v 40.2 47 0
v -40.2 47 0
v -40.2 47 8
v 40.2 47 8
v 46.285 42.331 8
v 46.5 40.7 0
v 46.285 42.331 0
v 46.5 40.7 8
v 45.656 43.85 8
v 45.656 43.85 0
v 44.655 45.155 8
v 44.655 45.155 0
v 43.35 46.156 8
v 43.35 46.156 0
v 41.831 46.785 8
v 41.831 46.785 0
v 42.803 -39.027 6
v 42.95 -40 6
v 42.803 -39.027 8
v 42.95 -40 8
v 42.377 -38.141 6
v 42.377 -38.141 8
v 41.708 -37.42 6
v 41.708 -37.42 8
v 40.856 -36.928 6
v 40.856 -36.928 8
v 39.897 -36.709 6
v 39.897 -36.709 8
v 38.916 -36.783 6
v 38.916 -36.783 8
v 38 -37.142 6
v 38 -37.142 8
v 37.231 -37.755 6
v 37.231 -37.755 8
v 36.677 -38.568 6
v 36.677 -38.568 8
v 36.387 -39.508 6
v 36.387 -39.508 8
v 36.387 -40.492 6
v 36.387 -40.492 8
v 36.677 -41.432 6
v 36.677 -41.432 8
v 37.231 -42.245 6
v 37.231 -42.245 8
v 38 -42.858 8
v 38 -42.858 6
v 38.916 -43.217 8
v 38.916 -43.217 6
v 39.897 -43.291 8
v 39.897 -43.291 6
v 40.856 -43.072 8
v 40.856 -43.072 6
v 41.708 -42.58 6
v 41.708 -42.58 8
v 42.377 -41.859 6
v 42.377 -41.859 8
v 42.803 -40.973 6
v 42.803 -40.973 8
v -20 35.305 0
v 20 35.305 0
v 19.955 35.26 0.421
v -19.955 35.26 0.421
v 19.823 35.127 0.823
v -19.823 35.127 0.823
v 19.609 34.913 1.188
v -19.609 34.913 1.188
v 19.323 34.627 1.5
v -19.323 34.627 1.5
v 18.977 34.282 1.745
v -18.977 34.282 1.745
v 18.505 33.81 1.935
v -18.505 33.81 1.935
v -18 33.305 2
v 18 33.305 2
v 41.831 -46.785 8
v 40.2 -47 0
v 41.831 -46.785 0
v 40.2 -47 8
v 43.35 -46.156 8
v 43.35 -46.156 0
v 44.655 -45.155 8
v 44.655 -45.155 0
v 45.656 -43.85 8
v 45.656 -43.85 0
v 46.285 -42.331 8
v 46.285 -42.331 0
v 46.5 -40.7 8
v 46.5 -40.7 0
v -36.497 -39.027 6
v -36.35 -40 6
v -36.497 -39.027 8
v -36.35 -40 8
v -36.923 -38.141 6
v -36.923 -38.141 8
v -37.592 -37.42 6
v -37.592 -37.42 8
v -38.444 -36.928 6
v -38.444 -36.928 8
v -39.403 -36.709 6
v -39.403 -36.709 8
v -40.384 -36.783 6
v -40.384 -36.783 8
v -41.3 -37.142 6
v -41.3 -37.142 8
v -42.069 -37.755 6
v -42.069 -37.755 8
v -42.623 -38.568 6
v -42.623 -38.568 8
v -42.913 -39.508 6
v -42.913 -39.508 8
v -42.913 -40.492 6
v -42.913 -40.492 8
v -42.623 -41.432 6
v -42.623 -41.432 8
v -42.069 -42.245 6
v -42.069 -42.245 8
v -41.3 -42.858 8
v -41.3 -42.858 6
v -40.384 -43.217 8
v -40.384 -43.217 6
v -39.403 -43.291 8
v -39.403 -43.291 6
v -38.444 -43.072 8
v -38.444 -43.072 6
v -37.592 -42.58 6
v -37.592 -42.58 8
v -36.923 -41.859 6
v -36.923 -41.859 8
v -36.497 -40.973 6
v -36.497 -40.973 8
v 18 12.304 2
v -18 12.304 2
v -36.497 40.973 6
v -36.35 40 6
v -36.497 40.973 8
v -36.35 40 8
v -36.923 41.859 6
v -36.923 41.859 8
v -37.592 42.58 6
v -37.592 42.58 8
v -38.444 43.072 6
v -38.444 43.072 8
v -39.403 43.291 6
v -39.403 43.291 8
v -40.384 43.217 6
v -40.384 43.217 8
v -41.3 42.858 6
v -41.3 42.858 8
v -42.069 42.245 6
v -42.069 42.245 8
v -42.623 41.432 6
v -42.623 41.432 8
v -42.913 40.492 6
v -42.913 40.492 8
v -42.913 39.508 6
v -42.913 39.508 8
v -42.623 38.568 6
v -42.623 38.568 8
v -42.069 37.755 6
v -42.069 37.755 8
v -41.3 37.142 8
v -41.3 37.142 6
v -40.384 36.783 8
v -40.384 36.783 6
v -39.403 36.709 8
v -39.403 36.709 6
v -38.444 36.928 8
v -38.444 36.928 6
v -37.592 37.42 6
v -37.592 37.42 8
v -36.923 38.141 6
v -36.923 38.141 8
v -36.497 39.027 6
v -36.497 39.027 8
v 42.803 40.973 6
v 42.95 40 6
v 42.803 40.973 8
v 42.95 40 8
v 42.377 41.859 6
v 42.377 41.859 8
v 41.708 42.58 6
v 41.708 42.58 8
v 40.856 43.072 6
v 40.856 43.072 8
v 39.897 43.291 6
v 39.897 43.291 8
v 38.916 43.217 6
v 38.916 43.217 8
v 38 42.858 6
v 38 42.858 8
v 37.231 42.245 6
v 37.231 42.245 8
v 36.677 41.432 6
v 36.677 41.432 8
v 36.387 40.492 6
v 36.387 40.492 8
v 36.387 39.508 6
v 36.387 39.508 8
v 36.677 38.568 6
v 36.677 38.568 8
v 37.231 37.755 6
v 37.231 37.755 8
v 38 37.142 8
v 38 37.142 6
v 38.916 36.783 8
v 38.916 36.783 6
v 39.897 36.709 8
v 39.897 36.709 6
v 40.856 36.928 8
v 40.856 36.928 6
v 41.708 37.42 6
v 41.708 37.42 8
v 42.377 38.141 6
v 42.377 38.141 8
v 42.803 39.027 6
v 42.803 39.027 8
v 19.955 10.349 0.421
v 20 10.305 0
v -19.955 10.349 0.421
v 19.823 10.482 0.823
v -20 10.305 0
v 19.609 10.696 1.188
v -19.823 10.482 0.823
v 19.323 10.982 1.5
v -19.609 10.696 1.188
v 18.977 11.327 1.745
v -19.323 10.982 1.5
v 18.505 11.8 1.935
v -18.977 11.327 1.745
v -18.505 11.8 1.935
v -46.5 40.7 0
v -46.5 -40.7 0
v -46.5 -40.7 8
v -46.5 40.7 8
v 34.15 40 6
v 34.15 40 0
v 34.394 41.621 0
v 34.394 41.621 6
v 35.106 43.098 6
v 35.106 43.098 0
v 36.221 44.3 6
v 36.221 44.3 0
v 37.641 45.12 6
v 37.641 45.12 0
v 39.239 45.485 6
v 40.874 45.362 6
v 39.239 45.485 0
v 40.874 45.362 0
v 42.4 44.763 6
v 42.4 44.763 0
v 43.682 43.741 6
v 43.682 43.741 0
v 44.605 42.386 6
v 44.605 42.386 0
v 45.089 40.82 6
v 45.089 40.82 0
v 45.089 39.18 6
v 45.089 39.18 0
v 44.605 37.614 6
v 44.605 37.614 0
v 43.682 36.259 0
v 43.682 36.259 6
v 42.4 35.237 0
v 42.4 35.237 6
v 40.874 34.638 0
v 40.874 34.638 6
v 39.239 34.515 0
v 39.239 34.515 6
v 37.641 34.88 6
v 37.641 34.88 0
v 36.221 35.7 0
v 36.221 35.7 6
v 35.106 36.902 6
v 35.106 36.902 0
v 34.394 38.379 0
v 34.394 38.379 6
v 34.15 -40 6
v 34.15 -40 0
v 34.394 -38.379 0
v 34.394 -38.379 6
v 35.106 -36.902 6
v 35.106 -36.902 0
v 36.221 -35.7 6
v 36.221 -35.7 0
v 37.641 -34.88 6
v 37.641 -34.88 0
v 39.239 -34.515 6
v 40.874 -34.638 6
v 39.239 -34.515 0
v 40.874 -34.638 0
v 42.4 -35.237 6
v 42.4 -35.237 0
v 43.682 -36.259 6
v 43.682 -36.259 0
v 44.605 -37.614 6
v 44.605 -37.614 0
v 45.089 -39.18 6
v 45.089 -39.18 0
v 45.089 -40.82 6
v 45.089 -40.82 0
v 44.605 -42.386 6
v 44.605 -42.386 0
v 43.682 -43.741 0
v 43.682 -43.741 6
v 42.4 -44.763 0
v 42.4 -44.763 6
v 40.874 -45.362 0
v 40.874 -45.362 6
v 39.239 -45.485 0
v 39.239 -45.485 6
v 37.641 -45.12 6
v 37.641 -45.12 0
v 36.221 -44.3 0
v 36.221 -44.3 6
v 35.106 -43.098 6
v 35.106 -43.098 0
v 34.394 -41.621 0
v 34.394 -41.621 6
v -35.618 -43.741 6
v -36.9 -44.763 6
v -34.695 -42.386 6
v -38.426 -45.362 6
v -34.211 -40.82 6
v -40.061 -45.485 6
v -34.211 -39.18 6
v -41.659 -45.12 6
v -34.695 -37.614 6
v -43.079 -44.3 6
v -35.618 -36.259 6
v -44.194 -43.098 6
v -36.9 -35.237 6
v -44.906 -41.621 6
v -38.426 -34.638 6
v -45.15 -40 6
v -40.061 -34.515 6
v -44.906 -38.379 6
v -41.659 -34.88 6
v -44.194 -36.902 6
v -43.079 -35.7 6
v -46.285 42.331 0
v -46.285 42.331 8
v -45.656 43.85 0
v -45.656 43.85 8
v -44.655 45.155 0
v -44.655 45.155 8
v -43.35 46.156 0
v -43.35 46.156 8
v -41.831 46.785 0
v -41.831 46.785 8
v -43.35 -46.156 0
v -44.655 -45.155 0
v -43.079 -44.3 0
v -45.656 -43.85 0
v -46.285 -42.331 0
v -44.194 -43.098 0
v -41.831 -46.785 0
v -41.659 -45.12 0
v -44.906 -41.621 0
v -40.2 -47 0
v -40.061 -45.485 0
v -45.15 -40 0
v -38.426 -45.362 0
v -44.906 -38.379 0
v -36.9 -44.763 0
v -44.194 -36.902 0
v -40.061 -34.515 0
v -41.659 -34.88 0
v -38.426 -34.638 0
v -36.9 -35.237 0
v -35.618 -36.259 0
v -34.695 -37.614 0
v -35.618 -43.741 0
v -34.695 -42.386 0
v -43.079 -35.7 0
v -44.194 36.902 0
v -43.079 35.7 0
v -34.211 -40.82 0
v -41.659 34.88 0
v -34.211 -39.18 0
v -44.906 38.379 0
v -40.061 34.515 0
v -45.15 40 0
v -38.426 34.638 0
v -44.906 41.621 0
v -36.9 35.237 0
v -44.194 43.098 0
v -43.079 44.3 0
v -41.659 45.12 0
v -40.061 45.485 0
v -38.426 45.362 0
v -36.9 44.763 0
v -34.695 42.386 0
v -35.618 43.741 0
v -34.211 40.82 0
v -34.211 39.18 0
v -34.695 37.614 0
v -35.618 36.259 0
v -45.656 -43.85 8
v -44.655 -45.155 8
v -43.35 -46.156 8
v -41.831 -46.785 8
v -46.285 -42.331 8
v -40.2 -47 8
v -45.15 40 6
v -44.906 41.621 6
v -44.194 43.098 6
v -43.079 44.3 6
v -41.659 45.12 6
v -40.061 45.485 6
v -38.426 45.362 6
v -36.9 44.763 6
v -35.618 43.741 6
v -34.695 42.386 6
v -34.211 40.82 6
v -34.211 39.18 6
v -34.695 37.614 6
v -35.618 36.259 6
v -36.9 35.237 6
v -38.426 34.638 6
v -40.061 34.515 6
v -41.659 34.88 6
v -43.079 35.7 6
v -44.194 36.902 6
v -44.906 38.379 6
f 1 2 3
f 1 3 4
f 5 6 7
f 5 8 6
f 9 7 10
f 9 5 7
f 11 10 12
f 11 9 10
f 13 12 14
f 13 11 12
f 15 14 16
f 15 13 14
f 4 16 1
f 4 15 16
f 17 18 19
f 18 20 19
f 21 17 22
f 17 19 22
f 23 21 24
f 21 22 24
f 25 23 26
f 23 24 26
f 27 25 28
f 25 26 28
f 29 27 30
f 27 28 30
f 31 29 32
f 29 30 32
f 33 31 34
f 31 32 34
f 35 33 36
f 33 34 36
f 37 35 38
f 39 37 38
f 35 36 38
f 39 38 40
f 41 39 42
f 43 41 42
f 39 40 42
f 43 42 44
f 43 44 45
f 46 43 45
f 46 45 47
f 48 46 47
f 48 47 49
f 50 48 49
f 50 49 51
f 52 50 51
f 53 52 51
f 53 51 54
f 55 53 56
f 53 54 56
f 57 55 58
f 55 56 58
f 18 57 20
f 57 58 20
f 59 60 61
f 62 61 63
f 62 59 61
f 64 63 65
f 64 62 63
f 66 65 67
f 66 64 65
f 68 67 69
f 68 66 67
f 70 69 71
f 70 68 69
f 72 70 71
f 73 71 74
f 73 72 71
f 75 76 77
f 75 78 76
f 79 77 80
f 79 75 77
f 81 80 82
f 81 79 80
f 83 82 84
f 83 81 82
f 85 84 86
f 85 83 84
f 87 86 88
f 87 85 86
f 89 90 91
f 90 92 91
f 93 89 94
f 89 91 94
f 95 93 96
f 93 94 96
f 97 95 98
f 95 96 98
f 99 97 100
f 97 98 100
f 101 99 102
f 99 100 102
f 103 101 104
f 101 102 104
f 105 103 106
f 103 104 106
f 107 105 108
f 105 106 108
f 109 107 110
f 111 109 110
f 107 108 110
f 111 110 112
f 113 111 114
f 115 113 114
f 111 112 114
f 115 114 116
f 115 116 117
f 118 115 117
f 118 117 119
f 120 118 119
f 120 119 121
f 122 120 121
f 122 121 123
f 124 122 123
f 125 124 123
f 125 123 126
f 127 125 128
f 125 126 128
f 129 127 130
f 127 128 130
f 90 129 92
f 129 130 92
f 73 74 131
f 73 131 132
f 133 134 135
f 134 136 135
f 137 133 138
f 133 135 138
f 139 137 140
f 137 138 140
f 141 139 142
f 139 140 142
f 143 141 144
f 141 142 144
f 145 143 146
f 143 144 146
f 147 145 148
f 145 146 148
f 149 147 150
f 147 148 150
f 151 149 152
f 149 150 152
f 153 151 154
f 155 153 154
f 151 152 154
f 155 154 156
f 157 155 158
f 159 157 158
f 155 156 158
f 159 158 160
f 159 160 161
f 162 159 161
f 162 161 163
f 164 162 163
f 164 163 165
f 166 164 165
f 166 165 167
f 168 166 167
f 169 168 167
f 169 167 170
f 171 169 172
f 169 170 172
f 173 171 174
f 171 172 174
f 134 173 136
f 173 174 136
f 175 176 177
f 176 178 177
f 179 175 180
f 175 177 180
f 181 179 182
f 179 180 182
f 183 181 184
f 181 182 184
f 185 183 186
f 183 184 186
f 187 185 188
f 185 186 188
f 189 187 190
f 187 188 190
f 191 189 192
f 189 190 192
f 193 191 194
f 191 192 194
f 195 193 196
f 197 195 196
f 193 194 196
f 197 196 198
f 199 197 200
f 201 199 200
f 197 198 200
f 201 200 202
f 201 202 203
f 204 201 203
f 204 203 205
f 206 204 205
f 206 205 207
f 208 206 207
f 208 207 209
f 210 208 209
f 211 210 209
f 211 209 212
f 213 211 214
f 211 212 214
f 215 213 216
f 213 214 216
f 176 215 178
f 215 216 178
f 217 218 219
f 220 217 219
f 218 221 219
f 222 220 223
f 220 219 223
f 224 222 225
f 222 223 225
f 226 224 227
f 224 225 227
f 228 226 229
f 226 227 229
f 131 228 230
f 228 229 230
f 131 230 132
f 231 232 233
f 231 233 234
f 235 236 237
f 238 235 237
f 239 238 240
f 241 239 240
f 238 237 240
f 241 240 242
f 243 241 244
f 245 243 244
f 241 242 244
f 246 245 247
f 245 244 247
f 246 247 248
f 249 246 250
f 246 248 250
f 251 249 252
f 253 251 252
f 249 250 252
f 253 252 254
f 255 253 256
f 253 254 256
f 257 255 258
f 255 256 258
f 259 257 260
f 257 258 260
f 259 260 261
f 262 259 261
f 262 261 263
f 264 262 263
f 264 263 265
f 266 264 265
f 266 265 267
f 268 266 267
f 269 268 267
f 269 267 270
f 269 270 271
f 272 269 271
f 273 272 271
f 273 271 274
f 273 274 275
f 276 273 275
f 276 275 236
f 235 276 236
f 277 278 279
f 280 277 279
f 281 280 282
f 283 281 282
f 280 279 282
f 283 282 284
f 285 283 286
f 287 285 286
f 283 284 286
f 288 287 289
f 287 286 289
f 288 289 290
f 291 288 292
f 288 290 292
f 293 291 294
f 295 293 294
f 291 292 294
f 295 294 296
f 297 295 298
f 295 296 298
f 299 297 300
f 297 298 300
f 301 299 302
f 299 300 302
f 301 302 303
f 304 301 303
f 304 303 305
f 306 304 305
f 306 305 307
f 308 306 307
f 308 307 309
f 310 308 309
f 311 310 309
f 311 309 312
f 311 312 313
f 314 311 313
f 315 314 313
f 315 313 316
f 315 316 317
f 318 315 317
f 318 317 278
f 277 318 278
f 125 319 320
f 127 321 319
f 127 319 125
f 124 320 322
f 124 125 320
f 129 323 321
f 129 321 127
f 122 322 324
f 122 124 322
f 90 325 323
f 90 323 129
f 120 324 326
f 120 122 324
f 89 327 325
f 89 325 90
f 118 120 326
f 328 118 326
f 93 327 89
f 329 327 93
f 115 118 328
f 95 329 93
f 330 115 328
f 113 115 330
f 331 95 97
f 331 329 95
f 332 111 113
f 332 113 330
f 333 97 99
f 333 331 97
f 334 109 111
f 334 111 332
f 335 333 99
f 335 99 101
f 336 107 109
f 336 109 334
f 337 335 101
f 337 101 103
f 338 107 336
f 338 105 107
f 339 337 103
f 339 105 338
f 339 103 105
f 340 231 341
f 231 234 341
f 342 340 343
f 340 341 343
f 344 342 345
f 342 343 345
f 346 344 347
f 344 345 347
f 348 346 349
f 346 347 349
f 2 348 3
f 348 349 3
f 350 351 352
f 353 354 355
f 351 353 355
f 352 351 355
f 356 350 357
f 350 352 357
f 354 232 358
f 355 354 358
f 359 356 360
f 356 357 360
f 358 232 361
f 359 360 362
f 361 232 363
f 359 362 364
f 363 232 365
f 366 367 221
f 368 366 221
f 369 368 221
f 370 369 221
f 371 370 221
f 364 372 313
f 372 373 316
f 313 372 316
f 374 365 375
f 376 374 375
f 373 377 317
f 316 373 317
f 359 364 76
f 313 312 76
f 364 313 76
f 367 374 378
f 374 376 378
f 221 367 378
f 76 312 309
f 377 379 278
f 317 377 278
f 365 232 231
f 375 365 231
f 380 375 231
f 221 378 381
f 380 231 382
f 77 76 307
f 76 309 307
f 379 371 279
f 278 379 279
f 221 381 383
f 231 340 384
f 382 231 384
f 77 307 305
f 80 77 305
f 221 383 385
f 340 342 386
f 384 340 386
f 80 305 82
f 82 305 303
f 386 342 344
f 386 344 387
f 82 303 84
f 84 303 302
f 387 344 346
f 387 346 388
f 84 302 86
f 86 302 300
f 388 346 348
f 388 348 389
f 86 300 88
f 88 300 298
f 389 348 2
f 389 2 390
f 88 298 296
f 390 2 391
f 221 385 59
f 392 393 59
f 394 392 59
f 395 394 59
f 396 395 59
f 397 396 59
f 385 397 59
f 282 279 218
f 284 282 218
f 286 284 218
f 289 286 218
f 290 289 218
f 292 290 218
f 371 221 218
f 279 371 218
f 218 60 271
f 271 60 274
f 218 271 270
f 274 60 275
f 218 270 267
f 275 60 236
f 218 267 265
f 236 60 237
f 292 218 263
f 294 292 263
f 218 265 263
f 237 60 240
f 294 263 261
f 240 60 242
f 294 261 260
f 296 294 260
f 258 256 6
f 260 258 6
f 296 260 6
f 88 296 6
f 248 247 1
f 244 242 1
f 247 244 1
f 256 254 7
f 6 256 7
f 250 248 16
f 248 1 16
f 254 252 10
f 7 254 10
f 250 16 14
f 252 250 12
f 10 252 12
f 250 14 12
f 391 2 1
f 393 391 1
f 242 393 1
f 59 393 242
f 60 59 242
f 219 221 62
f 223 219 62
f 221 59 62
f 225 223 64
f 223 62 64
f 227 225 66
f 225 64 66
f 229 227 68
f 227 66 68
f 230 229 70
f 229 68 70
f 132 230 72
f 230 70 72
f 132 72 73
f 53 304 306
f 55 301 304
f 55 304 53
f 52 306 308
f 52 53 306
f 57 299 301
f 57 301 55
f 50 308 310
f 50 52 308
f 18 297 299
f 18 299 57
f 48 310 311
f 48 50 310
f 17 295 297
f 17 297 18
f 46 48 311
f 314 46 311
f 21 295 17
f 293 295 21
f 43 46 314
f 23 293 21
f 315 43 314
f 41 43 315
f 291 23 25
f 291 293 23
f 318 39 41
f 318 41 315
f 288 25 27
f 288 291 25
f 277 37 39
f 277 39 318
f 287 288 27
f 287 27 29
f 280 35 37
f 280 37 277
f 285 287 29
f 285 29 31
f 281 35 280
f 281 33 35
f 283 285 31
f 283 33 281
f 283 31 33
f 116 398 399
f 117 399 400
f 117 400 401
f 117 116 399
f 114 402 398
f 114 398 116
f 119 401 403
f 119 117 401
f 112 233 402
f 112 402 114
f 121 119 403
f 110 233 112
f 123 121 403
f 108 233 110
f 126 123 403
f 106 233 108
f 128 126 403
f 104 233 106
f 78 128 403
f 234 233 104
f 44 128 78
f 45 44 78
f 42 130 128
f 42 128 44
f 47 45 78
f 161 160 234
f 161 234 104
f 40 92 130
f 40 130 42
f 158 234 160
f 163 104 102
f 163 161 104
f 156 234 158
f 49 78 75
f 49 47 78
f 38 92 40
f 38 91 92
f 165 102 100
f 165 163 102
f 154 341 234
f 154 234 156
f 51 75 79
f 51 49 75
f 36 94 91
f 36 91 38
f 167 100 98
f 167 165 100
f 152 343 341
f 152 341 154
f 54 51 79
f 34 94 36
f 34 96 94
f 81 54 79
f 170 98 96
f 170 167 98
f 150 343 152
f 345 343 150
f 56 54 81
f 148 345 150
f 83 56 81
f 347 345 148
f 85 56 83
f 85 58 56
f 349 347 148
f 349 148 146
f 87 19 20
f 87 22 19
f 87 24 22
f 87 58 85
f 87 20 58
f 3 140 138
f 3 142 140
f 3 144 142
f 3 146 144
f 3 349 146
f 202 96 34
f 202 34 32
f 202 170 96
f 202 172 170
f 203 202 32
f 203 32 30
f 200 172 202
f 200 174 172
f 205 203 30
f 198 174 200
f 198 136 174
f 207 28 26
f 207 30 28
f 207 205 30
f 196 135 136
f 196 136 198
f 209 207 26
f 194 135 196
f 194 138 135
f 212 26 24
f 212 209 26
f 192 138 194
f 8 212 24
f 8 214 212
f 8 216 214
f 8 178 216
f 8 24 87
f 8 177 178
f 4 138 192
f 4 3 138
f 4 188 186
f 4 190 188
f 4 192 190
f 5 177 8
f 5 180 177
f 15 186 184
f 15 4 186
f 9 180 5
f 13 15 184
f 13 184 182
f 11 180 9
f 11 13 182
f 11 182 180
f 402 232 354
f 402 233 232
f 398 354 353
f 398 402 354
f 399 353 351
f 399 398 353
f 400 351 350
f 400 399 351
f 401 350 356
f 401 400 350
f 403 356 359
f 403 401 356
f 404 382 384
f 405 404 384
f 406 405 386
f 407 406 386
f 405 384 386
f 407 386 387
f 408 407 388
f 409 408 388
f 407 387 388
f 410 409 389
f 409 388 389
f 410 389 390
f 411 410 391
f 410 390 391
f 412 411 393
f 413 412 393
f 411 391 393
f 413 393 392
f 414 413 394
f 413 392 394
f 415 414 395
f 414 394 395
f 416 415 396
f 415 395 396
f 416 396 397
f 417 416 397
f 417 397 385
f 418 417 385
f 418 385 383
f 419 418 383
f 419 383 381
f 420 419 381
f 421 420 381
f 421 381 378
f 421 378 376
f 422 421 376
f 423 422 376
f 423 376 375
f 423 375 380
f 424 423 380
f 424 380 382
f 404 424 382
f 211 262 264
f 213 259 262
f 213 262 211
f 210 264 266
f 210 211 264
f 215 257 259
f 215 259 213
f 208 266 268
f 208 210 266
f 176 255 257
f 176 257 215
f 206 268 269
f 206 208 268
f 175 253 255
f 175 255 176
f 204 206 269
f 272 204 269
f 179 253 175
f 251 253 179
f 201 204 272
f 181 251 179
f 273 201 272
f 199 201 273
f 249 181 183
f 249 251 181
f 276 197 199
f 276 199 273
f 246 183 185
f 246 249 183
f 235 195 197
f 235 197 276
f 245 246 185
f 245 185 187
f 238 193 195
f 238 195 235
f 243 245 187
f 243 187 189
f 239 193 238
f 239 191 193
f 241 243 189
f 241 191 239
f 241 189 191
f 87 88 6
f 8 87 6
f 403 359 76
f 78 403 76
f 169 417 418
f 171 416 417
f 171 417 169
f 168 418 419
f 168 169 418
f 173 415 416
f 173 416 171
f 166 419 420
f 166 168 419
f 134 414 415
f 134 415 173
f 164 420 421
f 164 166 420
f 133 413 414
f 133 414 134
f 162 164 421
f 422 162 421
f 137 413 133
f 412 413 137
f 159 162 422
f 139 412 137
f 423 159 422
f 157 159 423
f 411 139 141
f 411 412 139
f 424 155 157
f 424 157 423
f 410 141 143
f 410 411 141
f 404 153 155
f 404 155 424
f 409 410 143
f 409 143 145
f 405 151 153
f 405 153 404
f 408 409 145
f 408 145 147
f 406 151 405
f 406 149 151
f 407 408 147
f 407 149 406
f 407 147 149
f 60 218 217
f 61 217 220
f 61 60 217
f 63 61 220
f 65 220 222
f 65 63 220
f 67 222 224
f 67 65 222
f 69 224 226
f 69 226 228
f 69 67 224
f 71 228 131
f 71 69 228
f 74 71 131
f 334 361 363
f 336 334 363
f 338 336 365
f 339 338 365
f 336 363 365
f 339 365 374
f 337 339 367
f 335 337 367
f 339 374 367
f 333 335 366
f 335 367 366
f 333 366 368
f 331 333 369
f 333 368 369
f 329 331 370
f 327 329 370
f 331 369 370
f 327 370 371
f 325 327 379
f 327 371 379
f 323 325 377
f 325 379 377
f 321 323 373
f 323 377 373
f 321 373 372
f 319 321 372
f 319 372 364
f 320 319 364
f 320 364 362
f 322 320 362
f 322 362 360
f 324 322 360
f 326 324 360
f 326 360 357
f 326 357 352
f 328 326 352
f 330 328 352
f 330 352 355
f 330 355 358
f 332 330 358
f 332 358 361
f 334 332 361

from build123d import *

# Parameters (mm, degrees)
ESQUISSE1_W                                        = 93
ESQUISSE1_H                                        = 94
EXTRUSION1_DEPTH                                   = 8
CONG_1_R                                           = 6.3
CHAMBRAGE_POUR_VIS_T_TE_HEXAGONALE_M61_D           = 6.6
CHAMBRAGE_POUR_VIS_T_TE_HEXAGONALE_M61_CBORE_D     = 11
CHAMBRAGE_POUR_VIS_T_TE_HEXAGONALE_M61_CBORE_DEPTH = 6
ESQUISSE10_W                                       = 40
ESQUISSE10_H                                       = 25
ENL_V_MAT_EXTRU_1_DEPTH                            = 2
CONG_2_R                                           = 2


with BuildPart() as part:
    # Esquisse1 → Extrusion1 (new body)
    with BuildSketch(Plane.XY):
        Rectangle(ESQUISSE1_W, ESQUISSE1_H)
    extrude(amount=EXTRUSION1_DEPTH)

    # Congé1
    cong_1_edges = [part.edges().sort_by_distance(p)[0] for p in [
        (-46.5, 47, 4),
        (46.5, 47, 4),
        (46.5, -47, 4),
        (-46.5, -47, 4),
    ]]
    fillet(cong_1_edges, radius=CONG_1_R)

    # Chambrage pour vis à tête hexagonale M61 (through all)
    with Locations(Plane(origin=(0, 0, 0), x_dir=(-1, 0, 0), z_dir=(0, 0, -1))):
        with Locations((39.65, -40), (39.65, 40), (-39.65, 40), (-39.65, -40)):
            CounterBoreHole(CHAMBRAGE_POUR_VIS_T_TE_HEXAGONALE_M61_D / 2, CHAMBRAGE_POUR_VIS_T_TE_HEXAGONALE_M61_CBORE_D / 2, CHAMBRAGE_POUR_VIS_T_TE_HEXAGONALE_M61_CBORE_DEPTH)

    # Esquisse10 → Enlèv. mat.-Extru.1 (cut)
    with BuildSketch(Plane(origin=(0, 0, 0), x_dir=(-1, 0, 0), z_dir=(0, 0, -1))):
        with Locations((0, 22.804576525)):
            Rectangle(ESQUISSE10_W, ESQUISSE10_H)
    extrude(amount=-ENL_V_MAT_EXTRU_1_DEPTH, mode=Mode.SUBTRACT)

    # Congé2
    cong_2_edges = [part.edges().sort_by_distance(p)[0] for p in [
        (0, 35.304576525, 2),
        (-20, 22.804576525, 2),
        (0, 10.304576525, 2),
        (20, 22.804576525, 2),
    ]]
    fillet(cong_2_edges, radius=CONG_2_R - 0.0001)  # a hair under: the kernel refuses the full size


solid = part.part
